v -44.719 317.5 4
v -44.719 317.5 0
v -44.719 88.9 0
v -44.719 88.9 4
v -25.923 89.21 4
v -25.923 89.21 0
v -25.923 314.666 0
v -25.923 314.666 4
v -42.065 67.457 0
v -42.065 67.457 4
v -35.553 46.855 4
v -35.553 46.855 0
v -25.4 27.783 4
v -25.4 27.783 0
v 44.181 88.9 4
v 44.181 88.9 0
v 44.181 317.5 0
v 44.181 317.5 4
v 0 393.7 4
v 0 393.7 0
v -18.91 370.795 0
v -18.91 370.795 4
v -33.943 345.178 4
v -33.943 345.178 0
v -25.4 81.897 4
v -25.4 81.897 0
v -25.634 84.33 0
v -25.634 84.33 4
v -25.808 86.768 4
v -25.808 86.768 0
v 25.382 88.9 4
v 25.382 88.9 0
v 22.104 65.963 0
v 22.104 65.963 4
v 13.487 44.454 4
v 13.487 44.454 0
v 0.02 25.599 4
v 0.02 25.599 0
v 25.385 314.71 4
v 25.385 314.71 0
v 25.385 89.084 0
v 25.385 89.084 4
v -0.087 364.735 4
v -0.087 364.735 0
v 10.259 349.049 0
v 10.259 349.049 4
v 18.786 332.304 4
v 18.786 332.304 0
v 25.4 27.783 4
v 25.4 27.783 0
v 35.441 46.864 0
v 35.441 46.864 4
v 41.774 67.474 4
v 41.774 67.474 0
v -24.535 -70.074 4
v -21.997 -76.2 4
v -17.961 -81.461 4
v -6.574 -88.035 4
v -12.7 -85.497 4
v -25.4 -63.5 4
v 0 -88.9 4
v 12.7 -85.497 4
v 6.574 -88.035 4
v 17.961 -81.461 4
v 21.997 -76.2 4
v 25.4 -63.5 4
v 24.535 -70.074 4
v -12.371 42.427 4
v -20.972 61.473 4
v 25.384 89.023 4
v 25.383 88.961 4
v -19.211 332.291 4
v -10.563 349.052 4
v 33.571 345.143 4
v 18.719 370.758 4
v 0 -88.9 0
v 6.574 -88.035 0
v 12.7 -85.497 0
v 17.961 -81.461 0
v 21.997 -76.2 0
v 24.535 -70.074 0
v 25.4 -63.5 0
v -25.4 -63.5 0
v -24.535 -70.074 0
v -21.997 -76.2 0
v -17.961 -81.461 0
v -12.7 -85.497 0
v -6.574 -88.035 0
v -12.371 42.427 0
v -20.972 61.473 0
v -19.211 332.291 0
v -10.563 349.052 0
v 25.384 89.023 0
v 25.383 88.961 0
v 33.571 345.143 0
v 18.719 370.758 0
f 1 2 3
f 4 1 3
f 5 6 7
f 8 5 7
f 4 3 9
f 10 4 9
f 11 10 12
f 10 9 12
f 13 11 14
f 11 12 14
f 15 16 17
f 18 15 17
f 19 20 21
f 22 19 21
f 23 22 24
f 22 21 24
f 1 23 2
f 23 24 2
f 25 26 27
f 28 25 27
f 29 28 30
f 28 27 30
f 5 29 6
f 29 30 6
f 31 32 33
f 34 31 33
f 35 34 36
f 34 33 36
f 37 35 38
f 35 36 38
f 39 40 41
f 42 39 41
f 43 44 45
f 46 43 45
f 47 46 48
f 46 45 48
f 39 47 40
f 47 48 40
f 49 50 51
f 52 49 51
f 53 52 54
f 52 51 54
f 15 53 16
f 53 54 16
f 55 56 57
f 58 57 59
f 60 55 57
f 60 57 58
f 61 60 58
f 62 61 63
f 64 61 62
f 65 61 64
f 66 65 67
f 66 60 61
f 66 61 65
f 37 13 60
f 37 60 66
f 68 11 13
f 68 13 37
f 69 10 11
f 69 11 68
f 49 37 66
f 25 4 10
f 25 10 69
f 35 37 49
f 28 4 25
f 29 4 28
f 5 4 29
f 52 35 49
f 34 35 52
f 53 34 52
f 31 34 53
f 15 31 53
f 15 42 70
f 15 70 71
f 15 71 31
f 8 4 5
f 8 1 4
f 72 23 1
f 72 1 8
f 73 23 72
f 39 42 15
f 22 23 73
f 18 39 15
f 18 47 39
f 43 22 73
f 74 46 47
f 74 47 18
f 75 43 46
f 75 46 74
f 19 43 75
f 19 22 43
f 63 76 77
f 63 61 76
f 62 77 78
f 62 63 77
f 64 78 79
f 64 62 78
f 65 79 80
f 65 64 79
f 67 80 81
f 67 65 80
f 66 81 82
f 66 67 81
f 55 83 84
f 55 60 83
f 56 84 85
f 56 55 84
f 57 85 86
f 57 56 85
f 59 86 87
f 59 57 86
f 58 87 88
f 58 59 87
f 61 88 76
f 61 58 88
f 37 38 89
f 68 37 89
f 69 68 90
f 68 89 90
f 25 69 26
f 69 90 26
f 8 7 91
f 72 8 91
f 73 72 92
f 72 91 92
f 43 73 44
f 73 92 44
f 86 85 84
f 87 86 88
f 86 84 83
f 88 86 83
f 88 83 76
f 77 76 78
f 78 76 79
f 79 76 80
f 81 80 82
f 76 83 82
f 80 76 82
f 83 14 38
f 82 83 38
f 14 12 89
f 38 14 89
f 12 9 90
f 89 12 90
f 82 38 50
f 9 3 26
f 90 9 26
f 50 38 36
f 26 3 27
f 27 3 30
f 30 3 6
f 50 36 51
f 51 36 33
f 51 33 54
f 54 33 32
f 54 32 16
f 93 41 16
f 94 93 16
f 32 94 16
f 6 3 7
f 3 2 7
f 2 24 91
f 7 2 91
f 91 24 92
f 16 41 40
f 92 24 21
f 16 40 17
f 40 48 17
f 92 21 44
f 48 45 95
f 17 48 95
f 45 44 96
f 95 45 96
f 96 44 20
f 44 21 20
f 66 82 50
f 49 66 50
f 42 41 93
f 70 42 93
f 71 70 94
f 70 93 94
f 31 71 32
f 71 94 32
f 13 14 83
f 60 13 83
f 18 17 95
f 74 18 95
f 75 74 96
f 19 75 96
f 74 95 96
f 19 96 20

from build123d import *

# Parameters (mm, degrees)
F1_DEPTH = 4
F2_R     = 25.39999


# Not quite as in the source:
# - a fillet or chamfer is up to 0.001 mm smaller than in the source, because OpenCascade refuses the exact size


with BuildPart() as f1:
    # F0 (on Top) → F1 (new body)
    with BuildSketch(Plane.XY):
        with BuildLine():
            Line((25.4, 88.9), (25.4, 27.783106151))
            ThreePointArc((25.4, 27.783106151), (39.0875817391, 57.0211124393), (44.1814440725, 88.9))
            Line((44.1814440725, 88.9), (44.1814440725, 317.5))
            ThreePointArc((44.1814440725, 317.5), (26.6541395651, 358.2459104505), (0, 393.7))
            ThreePointArc((0, 393.7), (-26.9370466698, 358.2864987651), (-44.7185559275, 317.5))
            Line((-44.7185559275, 317.5), (-44.7185559275, 88.9))
            ThreePointArc((-44.7185559275, 88.9), (-39.2808523641, 57.0071475451), (-25.4, 27.783106151))
            Line((-25.4, 27.783106151), (-25.4, 81.8970223493))
            ThreePointArc((-25.4, 81.8970223493), (-25.7287156311, 85.5486031353), (-25.9225594861, 89.209821616))
            Line((-25.9225594861, 89.209821616), (-25.9225594861, 314.6655596019))
            ThreePointArc((-25.9225594861, 314.6655596019), (-15.1225925717, 340.7930484479), (-0.0869368678, 364.7349367673))
            ThreePointArc((-0.0869368678, 364.7349367673), (14.7574318658, 340.7960081036), (25.385447631, 314.7101331987))
            Line((25.385447631, 314.7101331987), (25.385447631, 89.0840377413))
            ThreePointArc((25.385447631, 89.0840377413), (25.3835184902, 88.992017936), (25.3815021522, 88.9))
            Line((25.3815021522, 88.9), (25.4, 88.9))
        make_face()
        with BuildLine():
            Line((-25.4, -88.9), (25.4, -88.9))
            Line((25.4, -88.9), (25.4, 27.783106151))
            ThreePointArc((25.4, 27.783106151), (13.8352633227, 12.8536673819), (0, 0))
            ThreePointArc((0, 0), (-13.8130547318, 12.8739710228), (-25.4, 27.783106151))
            Line((-25.4, 27.783106151), (-25.4, -88.9))
        make_face()
        with BuildLine():
            ThreePointArc((0, 0), (13.8352633227, 12.8536673819), (25.4, 27.783106151))
            Line((25.4, 27.783106151), (25.4, 88.9))
            Line((25.4, 88.9), (25.3815021522, 88.9))
            ThreePointArc((25.3815021522, 88.9), (18.4387554256, 54.950742752), (0.0203713554, 25.5991341412))
            ThreePointArc((0.0203713554, 25.5991341412), (-17.1734173627, 51.7235821598), (-25.4, 81.8970223493))
            Line((-25.4, 81.8970223493), (-25.4, 27.783106151))
            ThreePointArc((-25.4, 27.783106151), (-13.8130547318, 12.8739710228), (0, 0))
        make_face()
    extrude(amount=F1_DEPTH)

    # F2 (radius 25.4 in the source; OpenCascade refuses exactly that, so slightly less here)
    f2_edges = [f1.edges().sort_by_distance(p)[0] for p in [
        (-25.4, -88.9, 2),
        (25.4, -88.9, 2),
    ]]
    fillet(f2_edges, radius=F2_R)


solid = f1.part
